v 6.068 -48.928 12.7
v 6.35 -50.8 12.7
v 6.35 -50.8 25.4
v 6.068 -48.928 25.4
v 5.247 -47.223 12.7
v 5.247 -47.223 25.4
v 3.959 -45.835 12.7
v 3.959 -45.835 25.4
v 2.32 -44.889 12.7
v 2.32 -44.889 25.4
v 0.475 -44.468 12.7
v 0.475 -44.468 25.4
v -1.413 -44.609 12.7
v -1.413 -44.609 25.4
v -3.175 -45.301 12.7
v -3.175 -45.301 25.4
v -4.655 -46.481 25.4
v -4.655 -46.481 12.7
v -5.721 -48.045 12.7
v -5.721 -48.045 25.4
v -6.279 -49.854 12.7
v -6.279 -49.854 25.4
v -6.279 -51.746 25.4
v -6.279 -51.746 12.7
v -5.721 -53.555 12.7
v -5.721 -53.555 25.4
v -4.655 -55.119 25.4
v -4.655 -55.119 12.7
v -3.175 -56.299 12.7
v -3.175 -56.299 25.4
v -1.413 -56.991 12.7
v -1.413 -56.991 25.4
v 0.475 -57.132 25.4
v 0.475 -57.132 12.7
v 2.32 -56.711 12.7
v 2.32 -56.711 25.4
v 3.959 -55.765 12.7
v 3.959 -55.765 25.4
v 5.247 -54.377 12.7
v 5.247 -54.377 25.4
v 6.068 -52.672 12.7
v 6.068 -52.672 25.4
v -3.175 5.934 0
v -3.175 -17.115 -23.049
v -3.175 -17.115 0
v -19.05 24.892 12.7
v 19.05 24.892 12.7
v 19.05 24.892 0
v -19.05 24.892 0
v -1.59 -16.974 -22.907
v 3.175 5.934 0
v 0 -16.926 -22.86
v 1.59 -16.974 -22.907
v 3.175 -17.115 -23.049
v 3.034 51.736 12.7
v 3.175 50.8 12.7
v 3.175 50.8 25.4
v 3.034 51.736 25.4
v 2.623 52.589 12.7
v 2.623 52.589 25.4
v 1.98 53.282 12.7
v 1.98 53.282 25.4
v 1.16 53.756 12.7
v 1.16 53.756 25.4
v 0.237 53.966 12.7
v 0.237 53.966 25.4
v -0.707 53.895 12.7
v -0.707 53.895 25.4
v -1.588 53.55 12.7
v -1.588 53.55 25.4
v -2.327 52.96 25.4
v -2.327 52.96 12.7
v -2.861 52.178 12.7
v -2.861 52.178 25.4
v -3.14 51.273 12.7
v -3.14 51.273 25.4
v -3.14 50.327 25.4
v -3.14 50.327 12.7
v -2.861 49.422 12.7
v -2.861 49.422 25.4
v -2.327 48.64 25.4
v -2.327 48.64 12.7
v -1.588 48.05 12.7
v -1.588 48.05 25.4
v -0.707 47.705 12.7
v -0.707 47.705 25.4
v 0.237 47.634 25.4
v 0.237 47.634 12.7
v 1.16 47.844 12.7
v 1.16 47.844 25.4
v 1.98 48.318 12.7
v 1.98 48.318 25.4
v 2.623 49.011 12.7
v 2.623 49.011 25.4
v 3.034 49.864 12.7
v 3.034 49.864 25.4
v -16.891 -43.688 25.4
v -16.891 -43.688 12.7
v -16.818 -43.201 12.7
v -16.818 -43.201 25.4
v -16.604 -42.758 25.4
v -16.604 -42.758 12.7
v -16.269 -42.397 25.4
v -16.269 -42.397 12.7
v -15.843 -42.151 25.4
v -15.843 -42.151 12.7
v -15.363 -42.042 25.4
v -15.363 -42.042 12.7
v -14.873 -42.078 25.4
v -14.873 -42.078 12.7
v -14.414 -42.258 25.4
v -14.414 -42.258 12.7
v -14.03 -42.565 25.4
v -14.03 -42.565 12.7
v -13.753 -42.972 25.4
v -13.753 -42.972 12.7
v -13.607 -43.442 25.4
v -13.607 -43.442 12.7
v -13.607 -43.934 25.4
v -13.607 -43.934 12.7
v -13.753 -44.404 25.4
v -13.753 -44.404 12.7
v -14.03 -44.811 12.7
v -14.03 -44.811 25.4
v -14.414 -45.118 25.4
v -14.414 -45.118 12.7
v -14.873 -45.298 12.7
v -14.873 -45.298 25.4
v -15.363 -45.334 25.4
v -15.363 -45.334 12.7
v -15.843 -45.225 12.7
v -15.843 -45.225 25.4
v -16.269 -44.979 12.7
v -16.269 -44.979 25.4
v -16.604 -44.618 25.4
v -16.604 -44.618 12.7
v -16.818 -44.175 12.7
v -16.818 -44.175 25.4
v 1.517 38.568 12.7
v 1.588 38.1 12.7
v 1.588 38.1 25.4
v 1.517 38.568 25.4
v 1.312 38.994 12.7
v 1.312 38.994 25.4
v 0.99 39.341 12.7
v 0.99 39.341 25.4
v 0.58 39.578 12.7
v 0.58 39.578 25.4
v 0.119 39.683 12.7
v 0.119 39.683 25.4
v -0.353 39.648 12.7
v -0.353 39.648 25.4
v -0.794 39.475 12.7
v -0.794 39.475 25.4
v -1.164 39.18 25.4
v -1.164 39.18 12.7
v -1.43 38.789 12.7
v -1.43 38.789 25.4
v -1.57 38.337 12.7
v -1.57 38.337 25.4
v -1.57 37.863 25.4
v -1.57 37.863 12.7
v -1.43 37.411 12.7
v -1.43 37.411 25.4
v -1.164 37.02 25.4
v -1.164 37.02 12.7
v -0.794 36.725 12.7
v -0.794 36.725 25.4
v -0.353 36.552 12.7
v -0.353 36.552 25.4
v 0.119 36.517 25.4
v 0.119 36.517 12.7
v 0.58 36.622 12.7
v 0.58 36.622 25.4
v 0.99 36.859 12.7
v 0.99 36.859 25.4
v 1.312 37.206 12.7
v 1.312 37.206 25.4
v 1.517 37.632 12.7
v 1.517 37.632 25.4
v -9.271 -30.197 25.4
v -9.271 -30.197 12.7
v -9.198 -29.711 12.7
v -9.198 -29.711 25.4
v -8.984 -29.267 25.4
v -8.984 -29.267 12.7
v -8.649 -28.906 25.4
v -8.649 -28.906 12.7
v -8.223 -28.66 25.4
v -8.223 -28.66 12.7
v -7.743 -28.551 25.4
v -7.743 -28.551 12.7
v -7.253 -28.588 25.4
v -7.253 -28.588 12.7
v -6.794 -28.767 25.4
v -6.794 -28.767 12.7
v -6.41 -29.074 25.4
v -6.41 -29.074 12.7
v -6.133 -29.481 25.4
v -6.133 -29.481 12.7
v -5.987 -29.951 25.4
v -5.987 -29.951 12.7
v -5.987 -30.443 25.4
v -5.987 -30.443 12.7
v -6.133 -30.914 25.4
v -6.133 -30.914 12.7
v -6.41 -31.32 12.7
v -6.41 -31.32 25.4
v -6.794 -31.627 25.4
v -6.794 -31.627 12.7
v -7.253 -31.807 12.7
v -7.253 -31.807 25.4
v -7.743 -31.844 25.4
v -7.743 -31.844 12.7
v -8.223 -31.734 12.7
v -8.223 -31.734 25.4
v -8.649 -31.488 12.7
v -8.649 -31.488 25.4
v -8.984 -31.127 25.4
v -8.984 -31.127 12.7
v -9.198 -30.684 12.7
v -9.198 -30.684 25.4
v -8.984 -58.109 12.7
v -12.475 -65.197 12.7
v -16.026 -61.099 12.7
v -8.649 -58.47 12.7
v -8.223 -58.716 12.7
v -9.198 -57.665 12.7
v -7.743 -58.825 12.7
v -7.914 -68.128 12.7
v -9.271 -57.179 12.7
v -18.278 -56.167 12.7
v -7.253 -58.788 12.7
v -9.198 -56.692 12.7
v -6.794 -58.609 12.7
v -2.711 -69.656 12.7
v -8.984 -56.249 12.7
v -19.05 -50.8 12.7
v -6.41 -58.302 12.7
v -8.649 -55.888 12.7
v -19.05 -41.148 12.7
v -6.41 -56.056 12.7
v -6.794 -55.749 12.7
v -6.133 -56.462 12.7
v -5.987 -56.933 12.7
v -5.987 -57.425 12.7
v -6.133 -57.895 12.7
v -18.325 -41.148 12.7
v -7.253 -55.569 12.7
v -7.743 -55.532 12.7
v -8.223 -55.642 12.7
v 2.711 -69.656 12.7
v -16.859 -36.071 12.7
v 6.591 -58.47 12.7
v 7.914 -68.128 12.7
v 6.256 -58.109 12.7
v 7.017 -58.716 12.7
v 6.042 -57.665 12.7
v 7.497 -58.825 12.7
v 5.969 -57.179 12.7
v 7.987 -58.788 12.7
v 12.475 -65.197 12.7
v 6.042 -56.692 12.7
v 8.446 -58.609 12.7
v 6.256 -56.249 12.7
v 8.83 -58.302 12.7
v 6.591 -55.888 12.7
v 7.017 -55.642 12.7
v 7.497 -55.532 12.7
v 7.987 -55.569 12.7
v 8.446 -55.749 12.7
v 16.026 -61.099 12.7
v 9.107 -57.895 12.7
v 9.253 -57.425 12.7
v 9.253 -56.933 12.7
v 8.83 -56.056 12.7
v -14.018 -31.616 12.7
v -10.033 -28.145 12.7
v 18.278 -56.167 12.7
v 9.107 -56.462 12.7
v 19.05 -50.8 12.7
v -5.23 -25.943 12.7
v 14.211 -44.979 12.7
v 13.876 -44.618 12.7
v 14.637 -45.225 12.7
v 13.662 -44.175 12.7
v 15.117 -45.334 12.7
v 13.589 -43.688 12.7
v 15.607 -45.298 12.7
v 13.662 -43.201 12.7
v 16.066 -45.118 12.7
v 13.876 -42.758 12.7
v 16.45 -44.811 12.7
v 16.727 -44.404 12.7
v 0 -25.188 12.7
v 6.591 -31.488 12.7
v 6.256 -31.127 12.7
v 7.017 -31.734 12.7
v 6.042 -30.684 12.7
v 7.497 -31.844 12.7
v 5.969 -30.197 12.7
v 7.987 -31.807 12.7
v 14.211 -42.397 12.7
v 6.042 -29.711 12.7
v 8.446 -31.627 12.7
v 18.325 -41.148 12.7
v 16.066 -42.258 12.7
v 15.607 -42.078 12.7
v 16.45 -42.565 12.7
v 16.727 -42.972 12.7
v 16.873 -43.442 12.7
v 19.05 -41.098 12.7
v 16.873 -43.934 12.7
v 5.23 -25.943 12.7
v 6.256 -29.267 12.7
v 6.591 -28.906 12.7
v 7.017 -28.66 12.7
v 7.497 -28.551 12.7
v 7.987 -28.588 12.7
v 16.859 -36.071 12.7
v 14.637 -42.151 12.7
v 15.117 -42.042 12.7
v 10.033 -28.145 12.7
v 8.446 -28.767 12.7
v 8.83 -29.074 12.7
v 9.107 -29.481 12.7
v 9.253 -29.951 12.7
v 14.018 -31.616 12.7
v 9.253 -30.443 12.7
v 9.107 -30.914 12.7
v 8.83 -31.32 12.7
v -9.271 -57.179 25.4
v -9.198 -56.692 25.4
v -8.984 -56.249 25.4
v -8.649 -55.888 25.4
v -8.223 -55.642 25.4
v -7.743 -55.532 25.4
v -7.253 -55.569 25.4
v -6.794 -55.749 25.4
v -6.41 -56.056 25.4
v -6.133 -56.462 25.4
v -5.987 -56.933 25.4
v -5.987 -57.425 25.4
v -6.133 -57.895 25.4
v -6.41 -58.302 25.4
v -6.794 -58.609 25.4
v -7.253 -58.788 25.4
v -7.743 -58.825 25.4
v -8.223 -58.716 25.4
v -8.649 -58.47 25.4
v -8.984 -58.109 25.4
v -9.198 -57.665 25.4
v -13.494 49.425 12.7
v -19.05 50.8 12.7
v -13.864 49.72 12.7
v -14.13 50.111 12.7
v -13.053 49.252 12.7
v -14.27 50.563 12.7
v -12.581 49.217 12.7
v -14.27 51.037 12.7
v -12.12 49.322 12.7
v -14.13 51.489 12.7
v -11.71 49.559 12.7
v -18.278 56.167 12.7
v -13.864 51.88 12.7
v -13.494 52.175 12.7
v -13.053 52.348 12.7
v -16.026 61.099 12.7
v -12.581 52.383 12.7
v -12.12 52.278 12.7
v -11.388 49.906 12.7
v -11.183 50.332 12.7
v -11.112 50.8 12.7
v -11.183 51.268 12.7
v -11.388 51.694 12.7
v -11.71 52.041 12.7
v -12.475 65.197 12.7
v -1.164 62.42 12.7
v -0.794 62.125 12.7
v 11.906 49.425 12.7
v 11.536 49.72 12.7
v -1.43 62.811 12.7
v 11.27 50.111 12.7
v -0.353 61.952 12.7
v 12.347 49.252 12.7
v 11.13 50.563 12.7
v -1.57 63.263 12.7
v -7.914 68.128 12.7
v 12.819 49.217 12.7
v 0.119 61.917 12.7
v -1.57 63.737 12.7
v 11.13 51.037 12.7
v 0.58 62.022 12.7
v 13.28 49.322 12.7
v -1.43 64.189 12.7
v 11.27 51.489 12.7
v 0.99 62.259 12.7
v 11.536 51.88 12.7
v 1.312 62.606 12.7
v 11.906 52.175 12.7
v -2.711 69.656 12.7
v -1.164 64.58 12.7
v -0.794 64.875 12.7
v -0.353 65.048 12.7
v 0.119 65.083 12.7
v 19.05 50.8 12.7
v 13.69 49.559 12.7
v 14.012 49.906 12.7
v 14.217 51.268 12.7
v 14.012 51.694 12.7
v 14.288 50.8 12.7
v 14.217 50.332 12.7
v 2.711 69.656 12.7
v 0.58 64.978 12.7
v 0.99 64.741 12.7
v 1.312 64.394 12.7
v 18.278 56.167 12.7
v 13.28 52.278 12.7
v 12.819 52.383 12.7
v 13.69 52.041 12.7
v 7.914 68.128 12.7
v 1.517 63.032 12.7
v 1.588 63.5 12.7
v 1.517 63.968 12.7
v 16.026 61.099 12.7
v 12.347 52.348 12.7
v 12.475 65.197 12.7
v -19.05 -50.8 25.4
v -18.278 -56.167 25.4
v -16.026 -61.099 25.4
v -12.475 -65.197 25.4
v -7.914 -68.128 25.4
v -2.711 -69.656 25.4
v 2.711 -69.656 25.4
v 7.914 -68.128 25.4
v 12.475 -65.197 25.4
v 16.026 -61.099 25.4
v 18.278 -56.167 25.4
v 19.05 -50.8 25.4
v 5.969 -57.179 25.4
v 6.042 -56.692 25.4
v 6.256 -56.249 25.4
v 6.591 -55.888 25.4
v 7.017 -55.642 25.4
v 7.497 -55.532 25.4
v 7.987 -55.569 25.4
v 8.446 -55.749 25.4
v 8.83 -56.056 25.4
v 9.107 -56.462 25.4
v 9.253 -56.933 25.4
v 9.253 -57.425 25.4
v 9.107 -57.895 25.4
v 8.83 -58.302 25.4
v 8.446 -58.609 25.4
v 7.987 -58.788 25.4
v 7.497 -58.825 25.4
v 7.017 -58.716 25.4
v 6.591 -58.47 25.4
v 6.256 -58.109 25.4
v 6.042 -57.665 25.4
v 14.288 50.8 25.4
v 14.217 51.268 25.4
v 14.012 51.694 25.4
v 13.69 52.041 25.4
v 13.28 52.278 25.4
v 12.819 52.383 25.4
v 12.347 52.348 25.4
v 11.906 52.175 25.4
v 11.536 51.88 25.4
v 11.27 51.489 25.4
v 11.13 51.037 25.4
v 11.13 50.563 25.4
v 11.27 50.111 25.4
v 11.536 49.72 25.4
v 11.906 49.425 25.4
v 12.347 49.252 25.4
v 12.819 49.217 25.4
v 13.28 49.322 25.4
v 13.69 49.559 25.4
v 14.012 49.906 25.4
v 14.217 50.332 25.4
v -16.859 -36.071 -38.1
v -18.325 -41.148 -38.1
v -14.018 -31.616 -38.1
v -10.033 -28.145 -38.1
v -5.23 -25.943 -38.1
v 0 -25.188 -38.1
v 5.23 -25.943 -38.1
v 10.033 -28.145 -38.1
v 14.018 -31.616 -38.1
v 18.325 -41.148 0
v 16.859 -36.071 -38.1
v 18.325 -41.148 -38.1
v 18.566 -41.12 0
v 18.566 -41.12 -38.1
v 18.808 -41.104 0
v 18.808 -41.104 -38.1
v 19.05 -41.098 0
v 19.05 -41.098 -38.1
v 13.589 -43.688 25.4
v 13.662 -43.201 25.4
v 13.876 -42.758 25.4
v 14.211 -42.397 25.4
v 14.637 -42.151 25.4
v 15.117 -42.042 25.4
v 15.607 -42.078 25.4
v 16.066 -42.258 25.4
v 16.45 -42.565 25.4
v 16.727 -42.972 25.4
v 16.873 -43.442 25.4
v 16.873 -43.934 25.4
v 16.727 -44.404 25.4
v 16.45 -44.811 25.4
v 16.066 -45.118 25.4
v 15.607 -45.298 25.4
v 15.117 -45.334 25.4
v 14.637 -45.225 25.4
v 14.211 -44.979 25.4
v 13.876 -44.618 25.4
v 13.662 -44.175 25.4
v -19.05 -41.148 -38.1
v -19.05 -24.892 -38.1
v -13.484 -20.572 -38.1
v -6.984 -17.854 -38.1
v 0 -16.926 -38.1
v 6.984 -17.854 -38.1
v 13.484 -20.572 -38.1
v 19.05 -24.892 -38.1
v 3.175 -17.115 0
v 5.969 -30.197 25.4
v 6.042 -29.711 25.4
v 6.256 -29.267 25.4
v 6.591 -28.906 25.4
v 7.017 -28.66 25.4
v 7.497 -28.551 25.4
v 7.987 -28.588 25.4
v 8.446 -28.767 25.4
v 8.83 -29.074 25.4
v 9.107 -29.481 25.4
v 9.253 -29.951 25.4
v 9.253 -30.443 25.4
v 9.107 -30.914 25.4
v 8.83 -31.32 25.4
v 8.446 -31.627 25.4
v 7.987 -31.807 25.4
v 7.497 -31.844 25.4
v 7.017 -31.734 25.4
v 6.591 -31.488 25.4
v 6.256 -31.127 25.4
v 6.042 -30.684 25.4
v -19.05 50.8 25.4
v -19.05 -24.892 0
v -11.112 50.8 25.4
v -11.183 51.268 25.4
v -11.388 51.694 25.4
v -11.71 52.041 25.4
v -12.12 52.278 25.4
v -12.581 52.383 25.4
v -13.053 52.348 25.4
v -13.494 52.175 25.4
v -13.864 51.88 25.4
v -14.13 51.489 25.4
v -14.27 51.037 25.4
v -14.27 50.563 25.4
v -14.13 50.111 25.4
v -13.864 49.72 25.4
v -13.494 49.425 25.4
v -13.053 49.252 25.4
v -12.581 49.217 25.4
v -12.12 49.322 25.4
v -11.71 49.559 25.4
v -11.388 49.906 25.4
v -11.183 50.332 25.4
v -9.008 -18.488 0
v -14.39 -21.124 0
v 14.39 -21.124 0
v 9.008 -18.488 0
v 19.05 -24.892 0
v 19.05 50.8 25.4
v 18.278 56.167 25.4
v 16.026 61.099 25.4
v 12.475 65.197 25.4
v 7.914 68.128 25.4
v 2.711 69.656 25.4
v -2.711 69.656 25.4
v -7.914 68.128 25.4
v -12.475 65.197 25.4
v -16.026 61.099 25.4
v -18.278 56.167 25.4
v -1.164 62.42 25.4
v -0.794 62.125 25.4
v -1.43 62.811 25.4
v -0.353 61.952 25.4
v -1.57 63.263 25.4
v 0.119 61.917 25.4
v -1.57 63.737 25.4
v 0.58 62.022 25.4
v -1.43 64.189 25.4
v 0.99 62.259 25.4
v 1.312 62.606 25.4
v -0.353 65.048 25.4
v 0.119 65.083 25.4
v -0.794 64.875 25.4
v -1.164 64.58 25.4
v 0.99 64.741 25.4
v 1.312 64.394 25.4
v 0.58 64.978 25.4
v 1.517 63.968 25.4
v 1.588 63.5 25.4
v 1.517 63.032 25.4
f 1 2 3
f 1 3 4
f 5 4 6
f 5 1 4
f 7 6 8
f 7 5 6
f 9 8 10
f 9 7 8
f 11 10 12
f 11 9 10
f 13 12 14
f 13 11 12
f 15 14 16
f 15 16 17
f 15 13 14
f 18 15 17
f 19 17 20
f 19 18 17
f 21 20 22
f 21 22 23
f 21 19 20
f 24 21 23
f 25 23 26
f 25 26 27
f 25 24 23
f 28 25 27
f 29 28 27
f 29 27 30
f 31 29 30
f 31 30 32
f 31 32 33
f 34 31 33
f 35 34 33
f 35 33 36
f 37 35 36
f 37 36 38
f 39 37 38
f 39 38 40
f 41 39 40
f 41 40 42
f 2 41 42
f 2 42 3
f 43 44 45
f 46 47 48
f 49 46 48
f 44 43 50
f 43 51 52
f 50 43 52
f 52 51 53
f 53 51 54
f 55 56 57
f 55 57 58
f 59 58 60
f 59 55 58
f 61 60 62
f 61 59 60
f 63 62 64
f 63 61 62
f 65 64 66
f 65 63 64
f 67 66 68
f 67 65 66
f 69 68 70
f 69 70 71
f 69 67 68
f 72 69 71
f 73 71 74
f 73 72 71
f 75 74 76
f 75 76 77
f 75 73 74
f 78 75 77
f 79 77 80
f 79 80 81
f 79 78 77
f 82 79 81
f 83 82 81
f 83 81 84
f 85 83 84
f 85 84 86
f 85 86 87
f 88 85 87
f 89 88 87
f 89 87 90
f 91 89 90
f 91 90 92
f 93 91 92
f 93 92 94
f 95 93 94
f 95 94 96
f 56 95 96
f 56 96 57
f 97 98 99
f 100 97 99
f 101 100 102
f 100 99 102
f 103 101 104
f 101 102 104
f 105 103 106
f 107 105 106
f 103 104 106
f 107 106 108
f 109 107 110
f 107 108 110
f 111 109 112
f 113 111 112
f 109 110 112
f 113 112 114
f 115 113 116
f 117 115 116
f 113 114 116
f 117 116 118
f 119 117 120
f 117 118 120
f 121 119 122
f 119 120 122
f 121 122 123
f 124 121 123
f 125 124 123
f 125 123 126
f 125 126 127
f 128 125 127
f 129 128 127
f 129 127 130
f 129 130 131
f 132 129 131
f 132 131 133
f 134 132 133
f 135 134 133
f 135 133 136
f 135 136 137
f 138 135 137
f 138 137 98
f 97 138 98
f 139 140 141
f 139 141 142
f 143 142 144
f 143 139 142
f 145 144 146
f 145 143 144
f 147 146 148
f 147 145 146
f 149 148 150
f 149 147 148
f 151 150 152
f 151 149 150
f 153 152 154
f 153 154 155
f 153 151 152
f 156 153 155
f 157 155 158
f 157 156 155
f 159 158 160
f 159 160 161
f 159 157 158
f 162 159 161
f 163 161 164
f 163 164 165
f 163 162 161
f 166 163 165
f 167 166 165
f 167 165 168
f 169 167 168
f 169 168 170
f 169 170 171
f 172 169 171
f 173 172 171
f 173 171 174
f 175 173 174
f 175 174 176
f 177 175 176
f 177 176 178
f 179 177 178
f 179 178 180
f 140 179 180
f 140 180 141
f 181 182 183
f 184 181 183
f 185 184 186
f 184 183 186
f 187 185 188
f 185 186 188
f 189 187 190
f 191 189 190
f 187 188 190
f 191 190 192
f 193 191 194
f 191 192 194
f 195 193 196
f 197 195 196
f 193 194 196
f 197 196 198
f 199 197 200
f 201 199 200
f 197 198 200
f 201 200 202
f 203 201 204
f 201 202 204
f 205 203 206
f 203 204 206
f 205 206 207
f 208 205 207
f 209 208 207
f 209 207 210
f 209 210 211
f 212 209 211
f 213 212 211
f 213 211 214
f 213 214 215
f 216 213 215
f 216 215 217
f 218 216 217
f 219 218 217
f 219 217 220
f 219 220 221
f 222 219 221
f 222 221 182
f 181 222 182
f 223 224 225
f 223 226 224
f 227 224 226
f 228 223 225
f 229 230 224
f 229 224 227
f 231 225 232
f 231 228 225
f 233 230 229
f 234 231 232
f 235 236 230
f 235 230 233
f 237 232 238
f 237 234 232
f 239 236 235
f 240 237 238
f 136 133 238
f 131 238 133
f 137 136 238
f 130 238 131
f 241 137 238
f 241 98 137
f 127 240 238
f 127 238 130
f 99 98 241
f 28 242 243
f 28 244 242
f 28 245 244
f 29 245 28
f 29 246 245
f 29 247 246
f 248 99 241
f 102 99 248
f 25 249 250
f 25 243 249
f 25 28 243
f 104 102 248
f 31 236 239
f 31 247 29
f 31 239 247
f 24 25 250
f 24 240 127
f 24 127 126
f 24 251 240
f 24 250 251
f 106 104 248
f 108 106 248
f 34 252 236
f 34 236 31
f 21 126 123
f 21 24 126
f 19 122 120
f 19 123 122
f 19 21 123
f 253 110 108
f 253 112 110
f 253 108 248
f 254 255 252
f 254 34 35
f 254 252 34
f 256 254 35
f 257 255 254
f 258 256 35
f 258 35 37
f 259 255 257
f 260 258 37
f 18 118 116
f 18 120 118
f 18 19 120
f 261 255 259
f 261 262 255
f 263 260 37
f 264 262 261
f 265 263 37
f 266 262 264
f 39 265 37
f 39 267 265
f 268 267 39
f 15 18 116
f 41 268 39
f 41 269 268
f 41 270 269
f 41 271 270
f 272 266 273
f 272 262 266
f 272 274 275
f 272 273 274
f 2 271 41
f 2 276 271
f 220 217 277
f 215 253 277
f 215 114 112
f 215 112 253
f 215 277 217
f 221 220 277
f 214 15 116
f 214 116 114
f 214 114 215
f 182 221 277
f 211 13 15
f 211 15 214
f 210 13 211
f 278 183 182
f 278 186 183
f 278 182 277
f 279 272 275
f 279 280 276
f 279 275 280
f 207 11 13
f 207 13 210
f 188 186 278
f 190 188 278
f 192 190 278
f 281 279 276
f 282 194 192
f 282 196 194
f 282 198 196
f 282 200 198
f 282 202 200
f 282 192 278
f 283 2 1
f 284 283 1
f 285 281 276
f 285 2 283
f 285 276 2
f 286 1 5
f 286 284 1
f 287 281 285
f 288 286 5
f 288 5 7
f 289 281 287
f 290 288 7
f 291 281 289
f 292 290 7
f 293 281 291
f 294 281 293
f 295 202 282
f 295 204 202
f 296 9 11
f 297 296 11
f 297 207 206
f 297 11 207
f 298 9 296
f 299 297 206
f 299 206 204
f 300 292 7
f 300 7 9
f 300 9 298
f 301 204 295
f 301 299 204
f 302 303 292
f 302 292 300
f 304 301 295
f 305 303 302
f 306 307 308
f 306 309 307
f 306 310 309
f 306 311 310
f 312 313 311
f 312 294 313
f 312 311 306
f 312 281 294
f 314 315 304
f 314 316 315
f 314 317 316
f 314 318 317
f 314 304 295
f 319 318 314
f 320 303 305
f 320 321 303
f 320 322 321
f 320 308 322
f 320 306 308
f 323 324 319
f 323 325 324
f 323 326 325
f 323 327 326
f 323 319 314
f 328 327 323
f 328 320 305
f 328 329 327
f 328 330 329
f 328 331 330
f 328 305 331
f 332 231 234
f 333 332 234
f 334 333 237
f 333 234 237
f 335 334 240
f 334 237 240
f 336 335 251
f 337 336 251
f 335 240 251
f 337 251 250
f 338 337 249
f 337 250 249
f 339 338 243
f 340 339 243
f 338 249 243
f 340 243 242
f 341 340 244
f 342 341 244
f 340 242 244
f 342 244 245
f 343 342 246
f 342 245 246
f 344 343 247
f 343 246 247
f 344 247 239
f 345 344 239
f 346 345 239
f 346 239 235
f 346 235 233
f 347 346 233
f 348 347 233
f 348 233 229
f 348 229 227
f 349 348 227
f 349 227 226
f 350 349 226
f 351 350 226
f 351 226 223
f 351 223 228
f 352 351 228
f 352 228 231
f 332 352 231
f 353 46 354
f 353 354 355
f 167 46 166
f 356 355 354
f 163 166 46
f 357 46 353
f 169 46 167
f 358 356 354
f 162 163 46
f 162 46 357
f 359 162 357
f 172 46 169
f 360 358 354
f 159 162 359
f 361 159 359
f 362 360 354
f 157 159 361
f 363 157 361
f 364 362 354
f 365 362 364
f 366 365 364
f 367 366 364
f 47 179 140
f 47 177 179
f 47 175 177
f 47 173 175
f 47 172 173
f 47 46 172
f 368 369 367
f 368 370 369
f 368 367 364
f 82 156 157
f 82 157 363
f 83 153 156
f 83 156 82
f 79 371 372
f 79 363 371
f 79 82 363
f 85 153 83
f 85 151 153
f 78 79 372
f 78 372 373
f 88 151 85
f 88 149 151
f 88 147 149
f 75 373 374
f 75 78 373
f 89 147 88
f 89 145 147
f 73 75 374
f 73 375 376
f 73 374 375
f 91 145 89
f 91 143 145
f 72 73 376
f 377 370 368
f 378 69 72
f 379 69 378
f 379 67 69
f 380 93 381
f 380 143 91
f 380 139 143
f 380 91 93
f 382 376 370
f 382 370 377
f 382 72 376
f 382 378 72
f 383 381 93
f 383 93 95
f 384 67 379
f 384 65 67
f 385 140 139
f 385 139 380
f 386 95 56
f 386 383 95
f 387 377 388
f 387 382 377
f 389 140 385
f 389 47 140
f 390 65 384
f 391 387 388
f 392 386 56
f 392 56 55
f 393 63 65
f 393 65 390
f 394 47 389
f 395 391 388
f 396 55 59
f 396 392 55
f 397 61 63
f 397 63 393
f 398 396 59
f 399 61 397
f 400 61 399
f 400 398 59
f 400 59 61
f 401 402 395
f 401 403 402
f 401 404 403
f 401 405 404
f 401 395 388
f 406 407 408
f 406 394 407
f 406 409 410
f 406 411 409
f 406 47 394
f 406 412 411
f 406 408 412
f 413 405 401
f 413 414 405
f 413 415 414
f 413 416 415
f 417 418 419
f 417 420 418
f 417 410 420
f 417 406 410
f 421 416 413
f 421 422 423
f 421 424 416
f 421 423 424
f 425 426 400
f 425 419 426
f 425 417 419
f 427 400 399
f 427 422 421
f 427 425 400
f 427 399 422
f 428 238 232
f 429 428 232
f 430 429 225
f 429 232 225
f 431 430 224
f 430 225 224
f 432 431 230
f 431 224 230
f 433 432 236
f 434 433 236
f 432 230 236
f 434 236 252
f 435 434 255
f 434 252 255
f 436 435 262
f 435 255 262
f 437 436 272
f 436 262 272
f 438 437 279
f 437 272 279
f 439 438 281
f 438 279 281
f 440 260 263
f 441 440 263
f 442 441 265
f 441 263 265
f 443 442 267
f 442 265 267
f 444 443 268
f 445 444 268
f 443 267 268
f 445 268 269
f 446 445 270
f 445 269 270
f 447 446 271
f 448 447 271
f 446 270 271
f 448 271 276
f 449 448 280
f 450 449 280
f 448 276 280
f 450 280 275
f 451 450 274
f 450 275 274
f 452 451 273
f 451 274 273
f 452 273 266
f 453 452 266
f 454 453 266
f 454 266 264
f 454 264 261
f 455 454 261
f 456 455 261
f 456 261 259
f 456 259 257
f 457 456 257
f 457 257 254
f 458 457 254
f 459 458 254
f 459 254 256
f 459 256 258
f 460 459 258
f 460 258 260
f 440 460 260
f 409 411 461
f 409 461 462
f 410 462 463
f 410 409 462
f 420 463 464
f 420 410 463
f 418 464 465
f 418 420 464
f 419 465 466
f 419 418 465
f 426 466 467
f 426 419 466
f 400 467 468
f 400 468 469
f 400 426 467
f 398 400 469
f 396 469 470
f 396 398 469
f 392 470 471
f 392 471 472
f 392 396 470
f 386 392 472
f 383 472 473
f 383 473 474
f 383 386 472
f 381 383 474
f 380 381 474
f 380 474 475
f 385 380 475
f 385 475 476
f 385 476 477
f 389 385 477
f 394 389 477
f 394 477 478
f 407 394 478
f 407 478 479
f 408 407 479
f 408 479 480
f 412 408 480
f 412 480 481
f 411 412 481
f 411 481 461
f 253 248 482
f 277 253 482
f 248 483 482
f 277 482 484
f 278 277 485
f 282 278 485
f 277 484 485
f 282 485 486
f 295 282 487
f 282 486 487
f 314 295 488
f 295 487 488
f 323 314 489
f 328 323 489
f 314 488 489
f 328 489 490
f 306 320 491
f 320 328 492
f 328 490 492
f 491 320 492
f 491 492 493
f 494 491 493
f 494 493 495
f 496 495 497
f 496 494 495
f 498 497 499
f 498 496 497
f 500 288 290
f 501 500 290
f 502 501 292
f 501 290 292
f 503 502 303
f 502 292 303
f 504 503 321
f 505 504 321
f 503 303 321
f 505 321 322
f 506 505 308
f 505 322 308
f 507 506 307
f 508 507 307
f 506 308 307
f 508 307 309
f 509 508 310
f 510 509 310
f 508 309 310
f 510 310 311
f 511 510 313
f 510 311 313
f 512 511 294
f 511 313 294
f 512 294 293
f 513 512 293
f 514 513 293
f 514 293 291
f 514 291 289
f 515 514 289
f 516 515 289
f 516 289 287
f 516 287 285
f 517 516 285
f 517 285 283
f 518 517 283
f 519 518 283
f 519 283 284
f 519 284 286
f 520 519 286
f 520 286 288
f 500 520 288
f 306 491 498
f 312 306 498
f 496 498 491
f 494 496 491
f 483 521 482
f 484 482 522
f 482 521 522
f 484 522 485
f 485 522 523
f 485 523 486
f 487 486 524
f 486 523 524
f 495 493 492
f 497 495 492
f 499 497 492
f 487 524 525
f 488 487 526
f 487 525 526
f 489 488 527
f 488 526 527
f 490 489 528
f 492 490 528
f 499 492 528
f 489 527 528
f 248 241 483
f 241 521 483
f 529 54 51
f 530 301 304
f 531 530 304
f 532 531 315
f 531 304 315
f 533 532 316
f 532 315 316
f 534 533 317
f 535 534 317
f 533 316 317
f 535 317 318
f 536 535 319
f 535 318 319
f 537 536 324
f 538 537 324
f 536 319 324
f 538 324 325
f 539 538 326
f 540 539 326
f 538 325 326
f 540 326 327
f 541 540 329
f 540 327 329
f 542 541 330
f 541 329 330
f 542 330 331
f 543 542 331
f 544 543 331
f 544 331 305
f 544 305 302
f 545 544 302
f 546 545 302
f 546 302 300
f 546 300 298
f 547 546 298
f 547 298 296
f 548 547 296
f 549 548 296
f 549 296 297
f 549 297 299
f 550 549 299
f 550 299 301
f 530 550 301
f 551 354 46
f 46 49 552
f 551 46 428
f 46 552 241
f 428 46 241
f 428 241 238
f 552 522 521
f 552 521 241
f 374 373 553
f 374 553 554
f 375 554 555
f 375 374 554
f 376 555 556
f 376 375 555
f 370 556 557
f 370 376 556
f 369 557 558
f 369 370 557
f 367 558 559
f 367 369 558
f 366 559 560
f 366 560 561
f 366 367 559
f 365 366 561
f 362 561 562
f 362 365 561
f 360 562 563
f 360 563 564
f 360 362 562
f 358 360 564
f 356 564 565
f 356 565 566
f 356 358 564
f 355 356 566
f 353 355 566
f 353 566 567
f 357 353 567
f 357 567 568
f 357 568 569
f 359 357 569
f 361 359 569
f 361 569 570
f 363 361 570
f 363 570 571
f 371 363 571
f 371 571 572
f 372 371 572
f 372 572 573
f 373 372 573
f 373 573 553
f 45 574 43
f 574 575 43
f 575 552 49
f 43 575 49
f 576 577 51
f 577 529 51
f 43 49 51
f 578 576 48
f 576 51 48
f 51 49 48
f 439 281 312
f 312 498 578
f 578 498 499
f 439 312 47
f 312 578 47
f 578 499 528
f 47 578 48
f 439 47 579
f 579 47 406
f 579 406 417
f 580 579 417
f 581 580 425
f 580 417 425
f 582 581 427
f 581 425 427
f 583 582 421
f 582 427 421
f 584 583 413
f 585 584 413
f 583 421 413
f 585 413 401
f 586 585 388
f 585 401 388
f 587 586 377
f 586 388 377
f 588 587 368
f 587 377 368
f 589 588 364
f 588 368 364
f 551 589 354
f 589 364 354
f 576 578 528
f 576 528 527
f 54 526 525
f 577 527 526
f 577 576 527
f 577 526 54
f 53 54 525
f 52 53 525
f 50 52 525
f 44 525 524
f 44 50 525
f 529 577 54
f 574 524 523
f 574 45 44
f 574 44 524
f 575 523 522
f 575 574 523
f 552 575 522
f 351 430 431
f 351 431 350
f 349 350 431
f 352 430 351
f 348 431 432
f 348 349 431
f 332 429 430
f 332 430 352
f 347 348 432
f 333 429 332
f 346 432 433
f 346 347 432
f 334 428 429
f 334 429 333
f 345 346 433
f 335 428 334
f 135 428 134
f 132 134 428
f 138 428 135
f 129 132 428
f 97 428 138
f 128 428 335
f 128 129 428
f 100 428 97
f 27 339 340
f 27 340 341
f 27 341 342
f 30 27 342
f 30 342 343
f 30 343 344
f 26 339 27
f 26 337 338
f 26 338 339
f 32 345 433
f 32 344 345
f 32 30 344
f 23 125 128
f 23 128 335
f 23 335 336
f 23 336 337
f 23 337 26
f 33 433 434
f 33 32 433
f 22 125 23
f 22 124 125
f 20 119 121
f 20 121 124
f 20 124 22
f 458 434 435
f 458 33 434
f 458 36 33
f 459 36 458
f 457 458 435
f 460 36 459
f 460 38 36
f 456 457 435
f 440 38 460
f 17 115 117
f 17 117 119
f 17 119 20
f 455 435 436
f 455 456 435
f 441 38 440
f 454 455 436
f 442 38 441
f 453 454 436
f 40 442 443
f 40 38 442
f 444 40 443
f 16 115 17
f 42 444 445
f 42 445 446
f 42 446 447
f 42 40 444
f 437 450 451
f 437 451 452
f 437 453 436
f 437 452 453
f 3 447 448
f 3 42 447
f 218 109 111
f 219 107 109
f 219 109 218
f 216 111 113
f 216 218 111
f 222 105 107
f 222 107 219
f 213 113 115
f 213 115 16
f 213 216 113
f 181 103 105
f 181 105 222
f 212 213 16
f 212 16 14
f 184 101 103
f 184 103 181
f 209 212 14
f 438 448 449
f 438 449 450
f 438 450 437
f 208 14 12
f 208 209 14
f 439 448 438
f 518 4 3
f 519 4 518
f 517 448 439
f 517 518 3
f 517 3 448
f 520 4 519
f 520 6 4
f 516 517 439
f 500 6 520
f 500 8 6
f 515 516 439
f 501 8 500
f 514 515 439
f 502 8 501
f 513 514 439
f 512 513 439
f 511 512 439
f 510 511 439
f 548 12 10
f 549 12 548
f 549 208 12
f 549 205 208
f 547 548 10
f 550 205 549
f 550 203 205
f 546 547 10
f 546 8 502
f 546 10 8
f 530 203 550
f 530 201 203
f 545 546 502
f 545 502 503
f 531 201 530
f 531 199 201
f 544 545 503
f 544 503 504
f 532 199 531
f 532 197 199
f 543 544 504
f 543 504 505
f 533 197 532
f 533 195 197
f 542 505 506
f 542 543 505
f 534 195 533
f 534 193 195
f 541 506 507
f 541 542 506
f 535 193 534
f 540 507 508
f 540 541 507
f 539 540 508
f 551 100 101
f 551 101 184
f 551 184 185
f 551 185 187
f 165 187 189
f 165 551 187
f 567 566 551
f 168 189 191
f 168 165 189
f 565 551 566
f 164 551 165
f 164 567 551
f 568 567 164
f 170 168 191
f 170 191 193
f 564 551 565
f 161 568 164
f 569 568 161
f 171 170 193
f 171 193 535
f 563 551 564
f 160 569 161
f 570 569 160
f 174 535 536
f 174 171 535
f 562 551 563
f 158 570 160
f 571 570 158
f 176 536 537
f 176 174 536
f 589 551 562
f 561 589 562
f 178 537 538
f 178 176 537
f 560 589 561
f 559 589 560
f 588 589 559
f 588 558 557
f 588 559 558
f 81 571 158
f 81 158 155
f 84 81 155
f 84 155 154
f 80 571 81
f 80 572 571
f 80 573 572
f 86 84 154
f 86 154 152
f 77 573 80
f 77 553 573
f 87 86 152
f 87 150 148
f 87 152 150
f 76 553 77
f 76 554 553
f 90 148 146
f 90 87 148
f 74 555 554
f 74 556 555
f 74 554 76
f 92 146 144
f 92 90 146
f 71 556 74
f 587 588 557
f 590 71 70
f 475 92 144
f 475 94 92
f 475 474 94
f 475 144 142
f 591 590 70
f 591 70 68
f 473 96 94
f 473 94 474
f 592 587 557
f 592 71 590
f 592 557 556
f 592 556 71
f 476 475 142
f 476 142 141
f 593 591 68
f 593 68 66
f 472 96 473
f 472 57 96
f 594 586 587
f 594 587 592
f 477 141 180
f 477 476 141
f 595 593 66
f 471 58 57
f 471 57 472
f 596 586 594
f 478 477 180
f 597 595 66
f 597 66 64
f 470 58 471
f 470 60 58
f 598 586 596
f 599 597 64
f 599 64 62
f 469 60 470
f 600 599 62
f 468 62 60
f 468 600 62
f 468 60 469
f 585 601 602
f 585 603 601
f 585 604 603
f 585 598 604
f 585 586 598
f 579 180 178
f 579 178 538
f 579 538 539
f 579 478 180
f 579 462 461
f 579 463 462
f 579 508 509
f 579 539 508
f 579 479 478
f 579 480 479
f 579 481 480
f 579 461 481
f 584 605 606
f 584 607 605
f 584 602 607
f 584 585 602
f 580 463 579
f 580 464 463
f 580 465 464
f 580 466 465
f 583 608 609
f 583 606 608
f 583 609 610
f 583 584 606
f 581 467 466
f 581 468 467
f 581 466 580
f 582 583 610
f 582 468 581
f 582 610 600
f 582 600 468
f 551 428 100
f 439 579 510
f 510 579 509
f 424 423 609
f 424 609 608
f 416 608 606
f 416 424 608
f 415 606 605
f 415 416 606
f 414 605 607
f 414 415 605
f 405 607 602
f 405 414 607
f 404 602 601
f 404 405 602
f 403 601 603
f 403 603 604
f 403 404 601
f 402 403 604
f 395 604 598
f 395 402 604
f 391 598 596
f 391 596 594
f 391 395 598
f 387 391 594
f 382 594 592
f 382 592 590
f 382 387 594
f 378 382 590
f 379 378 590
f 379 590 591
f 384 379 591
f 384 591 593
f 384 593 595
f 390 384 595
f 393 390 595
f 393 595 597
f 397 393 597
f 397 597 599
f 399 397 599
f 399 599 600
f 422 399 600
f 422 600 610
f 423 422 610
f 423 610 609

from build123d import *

# Parameters (mm, degrees)
SKETCH1_R           = 3.175
SKETCH1_R_2         = 6.35
SKETCH1_R_3         = 1.5875
BOSS_EXTRUDE1_DEPTH = 25.4
CUT_EXTRUDE1_REACH  = 40.1
SKETCH2_W           = 12.7
SKETCH2_H           = 44.958
CUT_EXTRUDE2_REACH  = 27.4
SKETCH3_R           = 1.651
BOSS_EXTRUDE2_DEPTH = 38.1
BOSS_EXTRUDE3_DEPTH = 12.7
BOSS_EXTRUDE4_DEPTH = 3.175


with BuildPart() as part:
    # Sketch1 → Boss-Extrude1 (new body)
    with BuildSketch(Plane.XY):
        with BuildLine():
            Line((-19.05, 50.8), (-19.05, -50.8))
            ThreePointArc((-19.05, -50.8), (0, -69.85), (19.05, -50.8))
            Line((19.05, -50.8), (19.05, 50.8))
            ThreePointArc((19.05, 50.8), (0, 69.85), (-19.05, 50.8))
        make_face()
        with Locations((0, 50.8)):
            Circle(SKETCH1_R, mode=Mode.SUBTRACT)
        with Locations((0, -50.8)):
            Circle(SKETCH1_R_2, mode=Mode.SUBTRACT)
        with Locations((0, 63.5)):
            Circle(SKETCH1_R_3, mode=Mode.SUBTRACT)
        with Locations((-12.7, 50.8)):
            Circle(SKETCH1_R_3, mode=Mode.SUBTRACT)
        with Locations((0, 38.1)):
            Circle(SKETCH1_R_3, mode=Mode.SUBTRACT)
        with Locations((12.7, 50.8)):
            Circle(SKETCH1_R_3, mode=Mode.SUBTRACT)
    extrude(amount=BOSS_EXTRUDE1_DEPTH)

    # Sketch2 → Cut-Extrude1 (cut, up to next)
    with BuildSketch(Plane(origin=(19.05, 0, 0), x_dir=(0, 0, -1), z_dir=(1, 0, 0)), mode=Mode.PRIVATE) as cut_extrude1_sk1:
        with Locations((-6.35, 47.371)):
            Rectangle(SKETCH2_W, SKETCH2_H)
    cut_extrude1_tool1 = extrude(cut_extrude1_sk1.sketch, amount=-CUT_EXTRUDE1_REACH, mode=Mode.PRIVATE) & part.part
    add(cut_extrude1_tool1.solids().sort_by_distance((19.05, 47.371, 6.35))[0], mode=Mode.SUBTRACT)
    # Sketch2 → Cut-Extrude1 (cut, up to next)
    with BuildSketch(Plane(origin=(19.05, 0, 0), x_dir=(0, 0, -1), z_dir=(1, 0, 0)), mode=Mode.PRIVATE) as cut_extrude1_sk2:
        with Locations((-6.35, -47.371)):
            Rectangle(SKETCH2_W, SKETCH2_H)
    cut_extrude1_tool2 = extrude(cut_extrude1_sk2.sketch, amount=-CUT_EXTRUDE1_REACH, mode=Mode.PRIVATE) & part.part
    add(cut_extrude1_tool2.solids().sort_by_distance((19.05, -47.371, 6.35))[0], mode=Mode.SUBTRACT)

    # Sketch3 → Cut-Extrude2 (cut, up to next)
    with BuildSketch(Plane(origin=(0, 0, 0), x_dir=(-1, 0, 0), z_dir=(0, 0, -1)), mode=Mode.PRIVATE) as cut_extrude2_sk1:
        with Locations((-7.62, -30.197275928)):
            Circle(SKETCH3_R)
    cut_extrude2_tool1 = extrude(cut_extrude2_sk1.sketch, amount=-CUT_EXTRUDE2_REACH, mode=Mode.PRIVATE) & part.part
    add(cut_extrude2_tool1.solids().sort_by_distance((7.62, -30.197276, 0))[0], mode=Mode.SUBTRACT)
    # Sketch3 → Cut-Extrude2 (cut, up to next)
    with BuildSketch(Plane(origin=(0, 0, 0), x_dir=(-1, 0, 0), z_dir=(0, 0, -1)), mode=Mode.PRIVATE) as cut_extrude2_sk2:
        with Locations((-15.24, -43.688)):
            Circle(SKETCH3_R)
    cut_extrude2_tool2 = extrude(cut_extrude2_sk2.sketch, amount=-CUT_EXTRUDE2_REACH, mode=Mode.PRIVATE) & part.part
    add(cut_extrude2_tool2.solids().sort_by_distance((15.24, -43.688, 0))[0], mode=Mode.SUBTRACT)
    # Sketch3 → Cut-Extrude2 (cut, up to next)
    with BuildSketch(Plane(origin=(0, 0, 0), x_dir=(-1, 0, 0), z_dir=(0, 0, -1)), mode=Mode.PRIVATE) as cut_extrude2_sk3:
        with Locations((-7.62, -57.178724072)):
            Circle(SKETCH3_R)
    cut_extrude2_tool3 = extrude(cut_extrude2_sk3.sketch, amount=-CUT_EXTRUDE2_REACH, mode=Mode.PRIVATE) & part.part
    add(cut_extrude2_tool3.solids().sort_by_distance((7.62, -57.178724, 0))[0], mode=Mode.SUBTRACT)
    # Sketch3 → Cut-Extrude2 (cut, up to next)
    with BuildSketch(Plane(origin=(0, 0, 0), x_dir=(-1, 0, 0), z_dir=(0, 0, -1)), mode=Mode.PRIVATE) as cut_extrude2_sk4:
        with Locations((7.62, -57.178724072)):
            Circle(SKETCH3_R)
    cut_extrude2_tool4 = extrude(cut_extrude2_sk4.sketch, amount=-CUT_EXTRUDE2_REACH, mode=Mode.PRIVATE) & part.part
    add(cut_extrude2_tool4.solids().sort_by_distance((-7.62, -57.178724, 0))[0], mode=Mode.SUBTRACT)
    # Sketch3 → Cut-Extrude2 (cut, up to next)
    with BuildSketch(Plane(origin=(0, 0, 0), x_dir=(-1, 0, 0), z_dir=(0, 0, -1)), mode=Mode.PRIVATE) as cut_extrude2_sk5:
        with Locations((15.24, -43.688)):
            Circle(SKETCH3_R)
    cut_extrude2_tool5 = extrude(cut_extrude2_sk5.sketch, amount=-CUT_EXTRUDE2_REACH, mode=Mode.PRIVATE) & part.part
    add(cut_extrude2_tool5.solids().sort_by_distance((-15.24, -43.688, 0))[0], mode=Mode.SUBTRACT)
    # Sketch3 → Cut-Extrude2 (cut, up to next)
    with BuildSketch(Plane(origin=(0, 0, 0), x_dir=(-1, 0, 0), z_dir=(0, 0, -1)), mode=Mode.PRIVATE) as cut_extrude2_sk6:
        with Locations((7.62, -30.197275928)):
            Circle(SKETCH3_R)
    cut_extrude2_tool6 = extrude(cut_extrude2_sk6.sketch, amount=-CUT_EXTRUDE2_REACH, mode=Mode.PRIVATE) & part.part
    add(cut_extrude2_tool6.solids().sort_by_distance((-7.62, -30.197276, 0))[0], mode=Mode.SUBTRACT)

    # Sketch5 → Boss-Extrude2 (add)
    with BuildSketch(Plane(origin=(0, 0, 0), x_dir=(-1, 0, 0), z_dir=(0, 0, -1))):
        with BuildLine():
            Line((-19.05, -41.097979346), (-19.05, -24.892))
            ThreePointArc((-19.05, -24.892), (0, -16.926234064), (19.05, -24.892))
            Line((19.05, -24.892), (19.05, -41.148))
            Line((19.05, -41.148), (18.324802864, -41.148))
            ThreePointArc((18.324802864, -41.148), (0, -25.188), (-18.324802864, -41.148))
            ThreePointArc((-18.324802864, -41.148), (-18.686539909, -41.110499348), (-19.05, -41.097979346))
        make_face()
    extrude(amount=BOSS_EXTRUDE2_DEPTH)

    # Sketch6 → Boss-Extrude3 (add)
    with BuildSketch(Plane.XY):
        with BuildLine():
            Line((-19.05, -24.892), (-19.05, -41.148))
            Line((-19.05, -41.148), (-18.324802864, -41.148))
            ThreePointArc((-18.324802864, -41.148), (0, -25.188), (18.324802864, -41.148))
            Line((18.324802864, -41.148), (19.05, -41.097979346))
            Line((19.05, -41.097979346), (19.05, -24.892))
            Line((19.05, -24.892), (-19.05, -24.892))
        make_face()
    extrude(amount=BOSS_EXTRUDE3_DEPTH)

    # Sketch7 → Boss-Extrude4 (add, symmetric)
    with BuildSketch(Plane(origin=(0, 0, 0), x_dir=(0, 0, -1), z_dir=(1, 0, 0))):
        Polygon((0, -19.466234064), (0, 5.933765936), (25.4, -19.466234064), align=None)
    extrude(amount=BOSS_EXTRUDE4_DEPTH, both=True)


solid = part.part
